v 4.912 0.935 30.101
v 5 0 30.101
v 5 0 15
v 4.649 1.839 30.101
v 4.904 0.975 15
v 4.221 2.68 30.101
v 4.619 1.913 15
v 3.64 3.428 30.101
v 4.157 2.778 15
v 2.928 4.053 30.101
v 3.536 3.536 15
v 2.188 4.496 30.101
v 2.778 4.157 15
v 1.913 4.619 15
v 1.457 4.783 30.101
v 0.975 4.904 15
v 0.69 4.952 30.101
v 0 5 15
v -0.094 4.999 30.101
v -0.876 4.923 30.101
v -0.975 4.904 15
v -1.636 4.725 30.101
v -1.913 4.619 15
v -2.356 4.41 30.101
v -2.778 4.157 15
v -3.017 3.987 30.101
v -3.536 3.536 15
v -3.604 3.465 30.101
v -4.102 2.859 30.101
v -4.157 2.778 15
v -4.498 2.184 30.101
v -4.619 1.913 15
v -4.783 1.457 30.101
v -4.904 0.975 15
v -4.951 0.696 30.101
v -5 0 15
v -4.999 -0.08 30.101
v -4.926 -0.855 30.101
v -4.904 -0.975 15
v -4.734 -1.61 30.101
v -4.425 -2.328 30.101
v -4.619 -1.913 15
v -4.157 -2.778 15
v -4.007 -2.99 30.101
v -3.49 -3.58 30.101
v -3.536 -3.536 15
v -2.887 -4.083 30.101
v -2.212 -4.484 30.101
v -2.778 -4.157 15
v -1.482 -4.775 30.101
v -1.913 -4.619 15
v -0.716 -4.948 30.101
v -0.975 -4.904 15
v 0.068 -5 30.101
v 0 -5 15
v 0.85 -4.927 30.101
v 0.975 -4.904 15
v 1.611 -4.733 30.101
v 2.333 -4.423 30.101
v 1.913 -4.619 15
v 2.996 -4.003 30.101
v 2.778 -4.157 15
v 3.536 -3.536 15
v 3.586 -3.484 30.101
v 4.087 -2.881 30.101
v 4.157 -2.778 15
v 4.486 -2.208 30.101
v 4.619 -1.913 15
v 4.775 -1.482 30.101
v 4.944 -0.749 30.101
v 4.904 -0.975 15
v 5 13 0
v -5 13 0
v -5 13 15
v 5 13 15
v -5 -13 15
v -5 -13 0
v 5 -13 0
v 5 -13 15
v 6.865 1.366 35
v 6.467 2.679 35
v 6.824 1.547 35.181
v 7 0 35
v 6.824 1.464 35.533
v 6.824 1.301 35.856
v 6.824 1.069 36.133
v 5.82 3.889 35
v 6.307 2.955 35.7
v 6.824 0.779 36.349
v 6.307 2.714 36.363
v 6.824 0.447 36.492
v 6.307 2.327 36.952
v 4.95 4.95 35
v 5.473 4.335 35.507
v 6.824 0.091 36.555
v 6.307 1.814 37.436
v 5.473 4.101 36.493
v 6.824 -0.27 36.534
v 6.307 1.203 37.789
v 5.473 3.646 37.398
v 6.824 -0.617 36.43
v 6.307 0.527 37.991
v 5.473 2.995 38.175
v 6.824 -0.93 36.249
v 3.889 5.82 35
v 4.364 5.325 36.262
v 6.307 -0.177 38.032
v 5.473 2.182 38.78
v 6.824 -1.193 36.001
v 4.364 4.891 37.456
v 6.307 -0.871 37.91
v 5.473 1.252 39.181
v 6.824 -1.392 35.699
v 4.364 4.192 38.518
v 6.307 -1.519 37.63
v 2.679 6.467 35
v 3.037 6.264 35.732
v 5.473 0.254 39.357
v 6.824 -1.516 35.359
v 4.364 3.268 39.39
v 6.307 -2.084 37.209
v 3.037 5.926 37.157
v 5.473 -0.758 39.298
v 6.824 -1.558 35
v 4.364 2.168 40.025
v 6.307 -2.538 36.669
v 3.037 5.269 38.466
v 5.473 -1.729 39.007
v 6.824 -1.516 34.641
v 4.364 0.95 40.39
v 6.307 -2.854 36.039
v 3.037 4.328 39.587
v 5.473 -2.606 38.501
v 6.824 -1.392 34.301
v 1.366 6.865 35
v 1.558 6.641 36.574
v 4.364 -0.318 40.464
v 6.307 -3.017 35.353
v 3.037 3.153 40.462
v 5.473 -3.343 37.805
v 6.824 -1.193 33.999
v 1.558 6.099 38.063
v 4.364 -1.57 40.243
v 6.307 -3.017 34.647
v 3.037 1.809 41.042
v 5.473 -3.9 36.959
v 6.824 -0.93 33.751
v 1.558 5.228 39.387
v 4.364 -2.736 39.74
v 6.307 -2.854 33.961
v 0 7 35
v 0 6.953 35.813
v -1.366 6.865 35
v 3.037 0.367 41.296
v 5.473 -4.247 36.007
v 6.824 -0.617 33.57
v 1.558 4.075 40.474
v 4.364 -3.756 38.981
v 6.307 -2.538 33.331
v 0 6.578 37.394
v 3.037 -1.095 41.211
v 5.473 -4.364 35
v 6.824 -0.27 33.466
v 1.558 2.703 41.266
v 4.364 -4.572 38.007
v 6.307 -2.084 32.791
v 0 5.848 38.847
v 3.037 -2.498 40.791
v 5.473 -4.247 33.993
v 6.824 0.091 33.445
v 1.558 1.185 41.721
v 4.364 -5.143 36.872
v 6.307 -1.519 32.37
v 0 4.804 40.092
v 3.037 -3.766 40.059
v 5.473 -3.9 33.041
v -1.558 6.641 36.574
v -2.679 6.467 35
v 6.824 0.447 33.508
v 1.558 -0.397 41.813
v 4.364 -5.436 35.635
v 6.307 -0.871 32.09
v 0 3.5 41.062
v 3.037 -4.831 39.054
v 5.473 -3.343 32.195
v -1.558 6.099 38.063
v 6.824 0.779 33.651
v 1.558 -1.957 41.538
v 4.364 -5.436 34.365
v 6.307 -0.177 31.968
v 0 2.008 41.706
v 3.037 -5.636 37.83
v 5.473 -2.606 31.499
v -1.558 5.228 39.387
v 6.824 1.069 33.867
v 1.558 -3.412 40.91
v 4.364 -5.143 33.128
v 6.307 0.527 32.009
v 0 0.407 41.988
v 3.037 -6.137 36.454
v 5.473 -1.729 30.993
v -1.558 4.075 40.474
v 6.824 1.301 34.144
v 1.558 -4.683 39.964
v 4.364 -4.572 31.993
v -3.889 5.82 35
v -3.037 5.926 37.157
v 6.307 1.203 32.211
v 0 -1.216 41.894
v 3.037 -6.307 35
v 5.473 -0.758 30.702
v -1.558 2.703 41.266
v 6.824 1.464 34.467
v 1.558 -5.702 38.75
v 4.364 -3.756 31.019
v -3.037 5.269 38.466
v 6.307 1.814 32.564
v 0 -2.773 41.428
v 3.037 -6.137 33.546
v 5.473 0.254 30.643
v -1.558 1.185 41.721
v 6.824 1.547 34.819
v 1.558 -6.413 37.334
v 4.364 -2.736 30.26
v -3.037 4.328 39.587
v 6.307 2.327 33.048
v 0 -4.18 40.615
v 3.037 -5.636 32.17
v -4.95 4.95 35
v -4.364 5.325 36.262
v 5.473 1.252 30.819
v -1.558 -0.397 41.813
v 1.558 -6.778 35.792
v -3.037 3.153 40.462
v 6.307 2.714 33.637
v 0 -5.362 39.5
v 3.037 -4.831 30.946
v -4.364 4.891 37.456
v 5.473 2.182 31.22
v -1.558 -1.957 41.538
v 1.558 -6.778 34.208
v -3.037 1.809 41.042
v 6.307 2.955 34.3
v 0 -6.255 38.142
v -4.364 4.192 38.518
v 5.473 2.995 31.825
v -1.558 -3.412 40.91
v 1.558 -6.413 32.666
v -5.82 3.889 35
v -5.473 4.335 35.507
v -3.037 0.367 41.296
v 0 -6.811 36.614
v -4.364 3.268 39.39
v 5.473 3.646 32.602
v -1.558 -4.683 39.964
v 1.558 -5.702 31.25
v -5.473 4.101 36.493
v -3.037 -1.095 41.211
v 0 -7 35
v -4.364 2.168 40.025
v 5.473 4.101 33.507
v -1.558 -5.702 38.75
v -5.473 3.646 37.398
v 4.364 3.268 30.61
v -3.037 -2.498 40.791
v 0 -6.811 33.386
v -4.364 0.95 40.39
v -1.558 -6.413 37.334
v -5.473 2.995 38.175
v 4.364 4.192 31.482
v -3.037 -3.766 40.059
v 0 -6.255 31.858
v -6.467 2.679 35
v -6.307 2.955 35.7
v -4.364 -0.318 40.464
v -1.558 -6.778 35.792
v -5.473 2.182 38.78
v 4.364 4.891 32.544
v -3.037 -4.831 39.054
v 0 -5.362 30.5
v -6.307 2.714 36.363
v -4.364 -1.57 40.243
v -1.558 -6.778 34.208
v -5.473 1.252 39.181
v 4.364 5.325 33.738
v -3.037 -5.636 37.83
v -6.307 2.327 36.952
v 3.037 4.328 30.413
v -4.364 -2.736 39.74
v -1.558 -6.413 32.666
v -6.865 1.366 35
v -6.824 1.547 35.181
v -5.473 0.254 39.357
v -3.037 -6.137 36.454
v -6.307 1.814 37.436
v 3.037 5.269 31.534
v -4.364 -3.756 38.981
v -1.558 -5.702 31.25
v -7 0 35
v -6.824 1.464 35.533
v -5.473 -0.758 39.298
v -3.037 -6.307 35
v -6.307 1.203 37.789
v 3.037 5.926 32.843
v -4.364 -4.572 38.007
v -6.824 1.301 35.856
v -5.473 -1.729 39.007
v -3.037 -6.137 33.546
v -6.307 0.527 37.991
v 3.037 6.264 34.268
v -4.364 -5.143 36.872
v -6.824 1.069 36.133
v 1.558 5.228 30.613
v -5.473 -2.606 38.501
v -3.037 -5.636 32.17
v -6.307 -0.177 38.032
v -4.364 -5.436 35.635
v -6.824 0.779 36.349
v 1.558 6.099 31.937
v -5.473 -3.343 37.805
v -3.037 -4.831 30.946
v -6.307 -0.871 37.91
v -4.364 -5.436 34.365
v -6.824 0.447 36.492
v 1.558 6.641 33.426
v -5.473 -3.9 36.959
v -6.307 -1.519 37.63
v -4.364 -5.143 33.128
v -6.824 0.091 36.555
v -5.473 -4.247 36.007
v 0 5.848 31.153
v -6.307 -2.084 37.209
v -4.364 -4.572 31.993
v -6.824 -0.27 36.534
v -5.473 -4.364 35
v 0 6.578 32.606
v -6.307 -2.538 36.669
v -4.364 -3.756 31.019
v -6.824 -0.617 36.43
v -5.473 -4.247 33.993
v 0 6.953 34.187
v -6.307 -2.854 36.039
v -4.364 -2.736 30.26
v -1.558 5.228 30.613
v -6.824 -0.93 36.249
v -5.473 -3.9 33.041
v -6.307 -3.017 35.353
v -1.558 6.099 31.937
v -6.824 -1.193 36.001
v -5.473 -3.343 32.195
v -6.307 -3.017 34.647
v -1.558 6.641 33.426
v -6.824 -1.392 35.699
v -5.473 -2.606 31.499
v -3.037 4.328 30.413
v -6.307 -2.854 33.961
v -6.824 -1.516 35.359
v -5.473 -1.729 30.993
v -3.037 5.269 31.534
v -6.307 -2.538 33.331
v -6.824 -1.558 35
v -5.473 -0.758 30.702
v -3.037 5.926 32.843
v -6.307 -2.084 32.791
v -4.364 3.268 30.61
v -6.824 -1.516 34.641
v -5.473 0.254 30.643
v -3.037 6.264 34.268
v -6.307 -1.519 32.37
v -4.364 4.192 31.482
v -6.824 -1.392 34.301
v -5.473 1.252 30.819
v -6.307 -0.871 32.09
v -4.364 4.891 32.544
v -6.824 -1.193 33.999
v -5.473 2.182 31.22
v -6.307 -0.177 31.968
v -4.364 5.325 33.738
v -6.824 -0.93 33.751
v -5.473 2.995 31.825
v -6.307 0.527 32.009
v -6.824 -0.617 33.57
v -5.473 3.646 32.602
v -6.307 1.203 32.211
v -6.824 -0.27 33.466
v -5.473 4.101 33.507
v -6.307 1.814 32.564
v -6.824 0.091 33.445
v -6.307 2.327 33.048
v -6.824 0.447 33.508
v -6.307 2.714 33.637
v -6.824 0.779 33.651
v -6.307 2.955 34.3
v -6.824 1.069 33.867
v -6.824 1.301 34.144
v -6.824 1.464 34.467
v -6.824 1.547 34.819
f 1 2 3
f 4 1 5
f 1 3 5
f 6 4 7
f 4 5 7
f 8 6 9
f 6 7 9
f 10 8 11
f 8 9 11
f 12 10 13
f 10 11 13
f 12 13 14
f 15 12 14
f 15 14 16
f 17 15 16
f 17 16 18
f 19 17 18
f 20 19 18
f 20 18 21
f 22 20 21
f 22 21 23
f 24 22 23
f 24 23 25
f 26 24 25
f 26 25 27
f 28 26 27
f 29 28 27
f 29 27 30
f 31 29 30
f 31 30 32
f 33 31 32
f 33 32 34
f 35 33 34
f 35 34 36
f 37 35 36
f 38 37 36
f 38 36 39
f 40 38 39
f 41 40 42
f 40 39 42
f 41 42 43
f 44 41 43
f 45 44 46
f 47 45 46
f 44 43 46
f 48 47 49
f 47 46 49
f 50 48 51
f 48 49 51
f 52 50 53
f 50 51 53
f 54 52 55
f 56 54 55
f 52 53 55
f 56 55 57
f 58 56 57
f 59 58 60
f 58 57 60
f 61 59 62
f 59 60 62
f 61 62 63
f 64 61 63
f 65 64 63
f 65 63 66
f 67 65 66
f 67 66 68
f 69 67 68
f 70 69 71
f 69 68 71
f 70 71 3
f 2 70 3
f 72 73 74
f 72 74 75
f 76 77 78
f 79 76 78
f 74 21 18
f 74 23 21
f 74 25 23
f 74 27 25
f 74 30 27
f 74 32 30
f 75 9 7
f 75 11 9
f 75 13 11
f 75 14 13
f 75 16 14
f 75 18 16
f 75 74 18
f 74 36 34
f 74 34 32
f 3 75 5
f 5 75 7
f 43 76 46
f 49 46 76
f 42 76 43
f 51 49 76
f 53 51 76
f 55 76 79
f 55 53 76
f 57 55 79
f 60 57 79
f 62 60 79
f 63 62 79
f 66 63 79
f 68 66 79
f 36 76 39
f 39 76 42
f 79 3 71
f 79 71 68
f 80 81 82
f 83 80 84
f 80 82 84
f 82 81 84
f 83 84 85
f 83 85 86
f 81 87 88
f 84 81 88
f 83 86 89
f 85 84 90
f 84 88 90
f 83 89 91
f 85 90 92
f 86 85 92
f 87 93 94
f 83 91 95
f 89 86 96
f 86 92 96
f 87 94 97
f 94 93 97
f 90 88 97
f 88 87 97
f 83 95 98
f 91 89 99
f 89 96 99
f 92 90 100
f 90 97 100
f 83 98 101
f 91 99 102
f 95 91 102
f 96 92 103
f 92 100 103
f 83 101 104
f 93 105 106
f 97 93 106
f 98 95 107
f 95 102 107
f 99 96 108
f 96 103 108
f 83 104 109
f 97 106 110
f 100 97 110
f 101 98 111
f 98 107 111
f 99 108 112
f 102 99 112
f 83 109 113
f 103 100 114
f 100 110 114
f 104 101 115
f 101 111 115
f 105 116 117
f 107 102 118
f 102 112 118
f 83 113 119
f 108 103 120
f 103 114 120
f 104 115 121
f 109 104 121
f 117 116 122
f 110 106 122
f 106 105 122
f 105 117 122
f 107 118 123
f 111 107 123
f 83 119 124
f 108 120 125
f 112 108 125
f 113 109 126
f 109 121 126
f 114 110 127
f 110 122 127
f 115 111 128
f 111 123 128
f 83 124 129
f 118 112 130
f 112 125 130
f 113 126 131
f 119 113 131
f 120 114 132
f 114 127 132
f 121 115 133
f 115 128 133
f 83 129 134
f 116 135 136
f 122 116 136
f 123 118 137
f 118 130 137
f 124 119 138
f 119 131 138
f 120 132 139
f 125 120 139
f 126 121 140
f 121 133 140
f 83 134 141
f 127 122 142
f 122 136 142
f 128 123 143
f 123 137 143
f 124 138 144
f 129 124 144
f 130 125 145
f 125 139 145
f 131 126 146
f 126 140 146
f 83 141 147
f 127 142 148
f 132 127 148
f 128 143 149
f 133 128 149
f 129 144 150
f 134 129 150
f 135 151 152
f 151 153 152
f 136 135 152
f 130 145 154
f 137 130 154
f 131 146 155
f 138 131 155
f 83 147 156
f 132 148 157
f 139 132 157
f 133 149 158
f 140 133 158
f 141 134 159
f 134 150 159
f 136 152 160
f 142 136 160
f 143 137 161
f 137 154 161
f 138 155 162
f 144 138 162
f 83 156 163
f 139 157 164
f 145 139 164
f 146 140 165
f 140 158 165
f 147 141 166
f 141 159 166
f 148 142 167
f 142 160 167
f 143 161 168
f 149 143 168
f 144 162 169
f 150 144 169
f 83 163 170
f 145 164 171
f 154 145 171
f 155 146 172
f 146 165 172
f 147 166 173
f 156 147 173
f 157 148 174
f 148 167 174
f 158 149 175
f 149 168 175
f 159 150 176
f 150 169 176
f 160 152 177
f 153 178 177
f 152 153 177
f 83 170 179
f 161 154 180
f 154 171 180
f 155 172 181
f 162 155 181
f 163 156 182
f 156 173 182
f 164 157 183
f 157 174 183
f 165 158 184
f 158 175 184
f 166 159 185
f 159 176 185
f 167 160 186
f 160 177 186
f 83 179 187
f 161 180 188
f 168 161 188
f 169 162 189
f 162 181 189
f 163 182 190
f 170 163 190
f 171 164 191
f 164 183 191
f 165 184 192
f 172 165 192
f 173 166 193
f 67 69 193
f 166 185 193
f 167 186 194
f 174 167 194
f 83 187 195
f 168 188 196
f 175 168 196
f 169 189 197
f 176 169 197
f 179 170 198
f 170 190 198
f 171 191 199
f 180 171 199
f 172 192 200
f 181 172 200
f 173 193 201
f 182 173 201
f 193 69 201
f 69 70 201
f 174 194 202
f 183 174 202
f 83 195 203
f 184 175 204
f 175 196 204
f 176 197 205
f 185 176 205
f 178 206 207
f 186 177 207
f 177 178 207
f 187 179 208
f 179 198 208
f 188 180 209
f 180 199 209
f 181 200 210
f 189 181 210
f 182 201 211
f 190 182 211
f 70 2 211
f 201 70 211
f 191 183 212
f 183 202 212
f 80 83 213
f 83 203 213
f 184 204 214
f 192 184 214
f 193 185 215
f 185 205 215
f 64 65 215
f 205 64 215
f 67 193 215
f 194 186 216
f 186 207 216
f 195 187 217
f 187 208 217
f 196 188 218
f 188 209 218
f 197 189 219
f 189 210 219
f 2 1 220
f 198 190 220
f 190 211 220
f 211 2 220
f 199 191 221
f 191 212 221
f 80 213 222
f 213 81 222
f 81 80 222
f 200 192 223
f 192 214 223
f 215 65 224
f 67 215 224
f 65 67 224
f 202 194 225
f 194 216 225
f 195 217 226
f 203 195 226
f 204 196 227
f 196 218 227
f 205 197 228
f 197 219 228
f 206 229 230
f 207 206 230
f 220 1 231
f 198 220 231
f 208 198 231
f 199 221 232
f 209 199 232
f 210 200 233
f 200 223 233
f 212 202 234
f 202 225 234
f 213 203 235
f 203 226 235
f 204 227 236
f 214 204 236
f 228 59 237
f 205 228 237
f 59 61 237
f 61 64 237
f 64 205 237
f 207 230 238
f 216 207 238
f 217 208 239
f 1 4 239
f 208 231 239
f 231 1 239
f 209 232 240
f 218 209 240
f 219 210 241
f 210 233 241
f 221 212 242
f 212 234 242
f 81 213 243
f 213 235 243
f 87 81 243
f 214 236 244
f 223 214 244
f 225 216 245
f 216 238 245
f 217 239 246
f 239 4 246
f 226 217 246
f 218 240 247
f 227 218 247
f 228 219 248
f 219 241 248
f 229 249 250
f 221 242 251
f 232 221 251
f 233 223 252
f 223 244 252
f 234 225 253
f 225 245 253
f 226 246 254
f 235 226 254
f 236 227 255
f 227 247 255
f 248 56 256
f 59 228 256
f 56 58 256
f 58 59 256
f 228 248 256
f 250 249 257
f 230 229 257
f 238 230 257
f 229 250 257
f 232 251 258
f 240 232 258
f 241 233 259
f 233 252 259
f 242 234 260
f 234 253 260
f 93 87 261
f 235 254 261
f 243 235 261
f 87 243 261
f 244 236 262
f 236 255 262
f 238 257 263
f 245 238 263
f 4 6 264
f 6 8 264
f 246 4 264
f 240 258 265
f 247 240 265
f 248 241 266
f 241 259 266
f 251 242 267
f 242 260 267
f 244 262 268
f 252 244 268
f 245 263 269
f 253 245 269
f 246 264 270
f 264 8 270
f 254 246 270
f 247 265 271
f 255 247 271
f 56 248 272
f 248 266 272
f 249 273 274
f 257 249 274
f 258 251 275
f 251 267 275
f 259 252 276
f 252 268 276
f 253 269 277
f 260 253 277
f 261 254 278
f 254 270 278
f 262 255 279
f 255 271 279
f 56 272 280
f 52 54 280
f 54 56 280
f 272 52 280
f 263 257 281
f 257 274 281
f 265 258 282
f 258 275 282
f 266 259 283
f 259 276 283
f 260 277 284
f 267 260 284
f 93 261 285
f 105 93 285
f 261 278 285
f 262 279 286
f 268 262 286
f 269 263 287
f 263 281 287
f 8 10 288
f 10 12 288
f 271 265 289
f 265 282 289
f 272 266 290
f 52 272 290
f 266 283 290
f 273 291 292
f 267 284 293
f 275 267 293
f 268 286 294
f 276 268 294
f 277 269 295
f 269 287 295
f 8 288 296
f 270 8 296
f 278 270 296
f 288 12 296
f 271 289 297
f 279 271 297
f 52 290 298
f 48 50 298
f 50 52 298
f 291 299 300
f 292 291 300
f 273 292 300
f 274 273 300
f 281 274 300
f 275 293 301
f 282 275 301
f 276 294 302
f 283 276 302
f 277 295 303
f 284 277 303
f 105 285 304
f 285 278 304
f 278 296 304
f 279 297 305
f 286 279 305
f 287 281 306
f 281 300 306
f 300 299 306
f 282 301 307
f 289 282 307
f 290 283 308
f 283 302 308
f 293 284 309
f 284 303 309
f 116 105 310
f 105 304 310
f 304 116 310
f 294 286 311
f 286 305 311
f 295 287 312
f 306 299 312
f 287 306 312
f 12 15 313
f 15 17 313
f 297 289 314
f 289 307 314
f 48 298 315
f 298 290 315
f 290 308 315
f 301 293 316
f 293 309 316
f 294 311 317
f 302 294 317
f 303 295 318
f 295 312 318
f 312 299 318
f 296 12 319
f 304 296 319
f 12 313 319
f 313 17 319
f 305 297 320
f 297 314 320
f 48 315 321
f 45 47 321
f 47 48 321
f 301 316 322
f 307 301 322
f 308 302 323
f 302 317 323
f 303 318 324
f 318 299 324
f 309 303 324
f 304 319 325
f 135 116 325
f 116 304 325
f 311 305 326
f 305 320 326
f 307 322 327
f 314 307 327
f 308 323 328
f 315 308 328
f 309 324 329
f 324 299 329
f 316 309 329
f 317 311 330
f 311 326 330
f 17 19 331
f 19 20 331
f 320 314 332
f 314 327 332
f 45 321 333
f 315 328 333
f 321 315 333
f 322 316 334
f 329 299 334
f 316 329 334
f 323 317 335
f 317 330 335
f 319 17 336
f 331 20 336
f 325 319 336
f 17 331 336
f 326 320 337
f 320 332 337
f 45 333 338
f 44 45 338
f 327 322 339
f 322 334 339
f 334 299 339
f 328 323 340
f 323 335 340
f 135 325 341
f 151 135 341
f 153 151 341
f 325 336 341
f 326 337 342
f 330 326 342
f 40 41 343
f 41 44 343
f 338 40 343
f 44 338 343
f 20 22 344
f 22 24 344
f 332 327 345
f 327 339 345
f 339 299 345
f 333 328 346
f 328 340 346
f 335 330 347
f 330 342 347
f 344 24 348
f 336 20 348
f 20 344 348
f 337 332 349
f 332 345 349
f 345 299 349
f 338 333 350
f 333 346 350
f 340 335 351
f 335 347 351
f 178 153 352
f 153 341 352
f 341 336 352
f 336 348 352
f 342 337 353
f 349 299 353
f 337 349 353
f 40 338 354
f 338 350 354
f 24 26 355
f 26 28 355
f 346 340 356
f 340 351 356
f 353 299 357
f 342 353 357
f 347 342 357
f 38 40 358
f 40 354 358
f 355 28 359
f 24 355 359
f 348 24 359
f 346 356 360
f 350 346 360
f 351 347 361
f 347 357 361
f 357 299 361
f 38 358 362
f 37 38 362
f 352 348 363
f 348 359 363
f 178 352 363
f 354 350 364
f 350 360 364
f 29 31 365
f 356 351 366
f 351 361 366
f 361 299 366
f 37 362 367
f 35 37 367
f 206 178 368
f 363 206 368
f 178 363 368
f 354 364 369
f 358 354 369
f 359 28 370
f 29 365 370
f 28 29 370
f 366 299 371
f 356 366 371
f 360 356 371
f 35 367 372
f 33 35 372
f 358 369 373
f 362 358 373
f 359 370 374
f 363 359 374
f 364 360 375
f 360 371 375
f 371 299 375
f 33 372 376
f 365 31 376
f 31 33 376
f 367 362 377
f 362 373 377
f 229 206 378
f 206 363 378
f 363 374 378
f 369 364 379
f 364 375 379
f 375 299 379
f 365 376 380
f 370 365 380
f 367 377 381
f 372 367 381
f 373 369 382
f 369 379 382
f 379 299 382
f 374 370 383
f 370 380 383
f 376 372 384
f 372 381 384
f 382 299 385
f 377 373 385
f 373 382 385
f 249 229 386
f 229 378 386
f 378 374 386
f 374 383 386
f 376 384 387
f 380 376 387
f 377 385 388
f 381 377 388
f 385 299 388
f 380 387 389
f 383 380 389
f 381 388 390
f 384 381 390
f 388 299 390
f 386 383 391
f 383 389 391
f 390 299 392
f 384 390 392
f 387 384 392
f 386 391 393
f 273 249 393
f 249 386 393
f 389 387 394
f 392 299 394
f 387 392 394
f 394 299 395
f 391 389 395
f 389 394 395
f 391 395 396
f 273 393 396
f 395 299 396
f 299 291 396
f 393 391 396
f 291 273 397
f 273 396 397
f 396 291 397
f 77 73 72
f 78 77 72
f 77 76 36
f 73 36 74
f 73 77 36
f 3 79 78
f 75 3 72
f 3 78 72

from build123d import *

# Parameters (mm, degrees)
SKETCH1_W           = 10
SKETCH1_H           = 26
BOSS_EXTRUDE1_DEPTH = 15
SKETCH2_R           = 5
BOSS_EXTRUDE2_DEPTH = 20


with BuildPart() as part:
    # Sketch1 → Boss-Extrude1 (new body)
    with BuildSketch(Plane.XY):
        Rectangle(SKETCH1_W, SKETCH1_H)
    extrude(amount=BOSS_EXTRUDE1_DEPTH)

    # Sketch2 → Boss-Extrude2 (add)
    with BuildSketch(Plane.XY.offset(15)):
        Circle(SKETCH2_R)
    extrude(amount=BOSS_EXTRUDE2_DEPTH)

    # Sketch3 → Revolve1 (revolve)
    with BuildSketch(Plane.XY.offset(35)):
        with BuildLine():
            Line((-7, 0), (7, 0))
            ThreePointArc((7, 0), (0, 7), (-7, 0))
        make_face()
    revolve(axis=Axis((-7, 0, 35), (1, 0, 0)))


solid = part.part
